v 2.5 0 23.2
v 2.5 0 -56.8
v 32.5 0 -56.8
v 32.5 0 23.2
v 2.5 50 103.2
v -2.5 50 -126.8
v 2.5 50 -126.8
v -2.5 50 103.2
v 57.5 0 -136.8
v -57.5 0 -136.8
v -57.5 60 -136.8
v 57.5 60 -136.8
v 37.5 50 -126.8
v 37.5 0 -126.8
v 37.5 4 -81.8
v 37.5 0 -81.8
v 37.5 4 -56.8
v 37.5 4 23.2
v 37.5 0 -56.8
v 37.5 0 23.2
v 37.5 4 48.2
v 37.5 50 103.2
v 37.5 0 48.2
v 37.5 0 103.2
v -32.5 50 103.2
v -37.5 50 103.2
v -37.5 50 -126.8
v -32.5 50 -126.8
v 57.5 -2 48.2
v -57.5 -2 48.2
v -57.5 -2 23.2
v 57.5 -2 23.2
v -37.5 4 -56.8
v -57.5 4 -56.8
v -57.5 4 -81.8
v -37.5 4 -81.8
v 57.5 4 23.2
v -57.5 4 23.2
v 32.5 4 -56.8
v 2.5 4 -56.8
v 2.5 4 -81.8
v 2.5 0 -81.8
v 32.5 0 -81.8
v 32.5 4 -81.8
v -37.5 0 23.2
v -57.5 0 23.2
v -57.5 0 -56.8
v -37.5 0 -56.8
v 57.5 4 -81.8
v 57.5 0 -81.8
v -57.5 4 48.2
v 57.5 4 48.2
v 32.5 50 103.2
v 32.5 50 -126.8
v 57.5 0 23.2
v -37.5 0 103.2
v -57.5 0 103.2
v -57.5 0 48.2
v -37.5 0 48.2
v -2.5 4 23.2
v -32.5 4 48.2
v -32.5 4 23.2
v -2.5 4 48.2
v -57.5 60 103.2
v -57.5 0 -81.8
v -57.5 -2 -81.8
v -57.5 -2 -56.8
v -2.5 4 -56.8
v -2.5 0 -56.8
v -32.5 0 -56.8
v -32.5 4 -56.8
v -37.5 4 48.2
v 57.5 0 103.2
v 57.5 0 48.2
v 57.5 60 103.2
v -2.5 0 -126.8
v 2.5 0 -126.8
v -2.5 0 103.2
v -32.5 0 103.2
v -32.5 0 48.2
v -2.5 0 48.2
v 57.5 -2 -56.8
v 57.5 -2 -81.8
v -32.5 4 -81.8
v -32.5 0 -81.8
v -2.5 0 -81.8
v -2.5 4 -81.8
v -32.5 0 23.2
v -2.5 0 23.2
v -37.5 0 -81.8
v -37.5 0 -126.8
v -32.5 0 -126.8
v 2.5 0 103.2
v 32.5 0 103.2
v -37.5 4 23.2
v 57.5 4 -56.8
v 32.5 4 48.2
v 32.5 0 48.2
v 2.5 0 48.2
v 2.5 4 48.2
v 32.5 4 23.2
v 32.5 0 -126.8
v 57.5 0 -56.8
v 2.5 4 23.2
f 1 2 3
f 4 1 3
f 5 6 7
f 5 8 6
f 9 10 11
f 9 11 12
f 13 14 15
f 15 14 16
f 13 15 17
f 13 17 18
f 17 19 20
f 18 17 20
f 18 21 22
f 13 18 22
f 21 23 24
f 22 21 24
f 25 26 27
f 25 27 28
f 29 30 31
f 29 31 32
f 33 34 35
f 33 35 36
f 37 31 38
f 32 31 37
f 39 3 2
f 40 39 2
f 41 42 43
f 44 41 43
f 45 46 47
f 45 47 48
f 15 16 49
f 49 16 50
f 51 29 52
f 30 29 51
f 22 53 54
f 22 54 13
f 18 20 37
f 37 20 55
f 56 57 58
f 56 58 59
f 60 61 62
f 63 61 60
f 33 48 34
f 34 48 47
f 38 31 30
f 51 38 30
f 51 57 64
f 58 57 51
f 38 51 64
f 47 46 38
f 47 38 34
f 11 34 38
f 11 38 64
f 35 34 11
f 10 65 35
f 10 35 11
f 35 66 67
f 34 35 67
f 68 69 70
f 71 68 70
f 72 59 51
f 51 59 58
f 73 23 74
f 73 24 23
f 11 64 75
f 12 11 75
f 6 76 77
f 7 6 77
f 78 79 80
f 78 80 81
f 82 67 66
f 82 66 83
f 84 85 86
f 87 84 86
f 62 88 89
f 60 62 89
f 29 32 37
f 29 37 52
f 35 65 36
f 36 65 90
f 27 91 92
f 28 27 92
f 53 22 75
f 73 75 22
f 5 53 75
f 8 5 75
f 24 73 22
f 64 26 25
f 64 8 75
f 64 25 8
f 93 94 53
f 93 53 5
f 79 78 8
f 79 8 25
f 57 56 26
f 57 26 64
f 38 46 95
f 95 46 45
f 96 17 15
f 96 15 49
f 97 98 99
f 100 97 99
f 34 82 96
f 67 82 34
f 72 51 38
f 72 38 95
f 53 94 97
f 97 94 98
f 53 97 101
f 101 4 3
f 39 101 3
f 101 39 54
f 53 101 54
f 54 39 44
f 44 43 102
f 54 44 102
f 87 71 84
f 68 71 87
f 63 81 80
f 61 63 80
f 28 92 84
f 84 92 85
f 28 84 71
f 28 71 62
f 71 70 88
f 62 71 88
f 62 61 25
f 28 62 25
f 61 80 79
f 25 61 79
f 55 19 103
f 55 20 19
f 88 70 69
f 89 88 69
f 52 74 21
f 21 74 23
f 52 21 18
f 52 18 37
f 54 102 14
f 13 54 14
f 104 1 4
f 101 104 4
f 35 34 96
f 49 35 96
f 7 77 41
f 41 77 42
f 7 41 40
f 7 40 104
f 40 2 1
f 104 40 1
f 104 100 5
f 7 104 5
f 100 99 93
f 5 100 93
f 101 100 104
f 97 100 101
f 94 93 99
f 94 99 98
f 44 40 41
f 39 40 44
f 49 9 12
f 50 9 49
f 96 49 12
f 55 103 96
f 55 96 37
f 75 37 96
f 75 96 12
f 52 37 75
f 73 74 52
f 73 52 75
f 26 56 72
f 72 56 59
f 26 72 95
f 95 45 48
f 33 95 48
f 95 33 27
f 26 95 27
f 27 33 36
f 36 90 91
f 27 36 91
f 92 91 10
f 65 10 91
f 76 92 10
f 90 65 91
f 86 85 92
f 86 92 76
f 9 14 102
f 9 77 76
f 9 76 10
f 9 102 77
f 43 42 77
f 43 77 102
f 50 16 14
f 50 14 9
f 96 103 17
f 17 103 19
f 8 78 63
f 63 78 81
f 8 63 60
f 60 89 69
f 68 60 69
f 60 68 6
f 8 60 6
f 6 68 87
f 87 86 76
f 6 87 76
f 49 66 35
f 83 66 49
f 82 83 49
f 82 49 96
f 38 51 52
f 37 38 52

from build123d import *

# Parameters (mm, degrees)
F0_W          = 20
F0_H          = 55
F0_W_2        = 5
F0_H_2        = 25
F0_W_3        = 30
F0_H_3        = 80
F0_H_4        = 45
F0_H_5        = 10
F1_DEPTH      = 60
F2_DEPTH      = 50
F3_DEPTH      = 4
F4_DEPTH      = 2
F4_DEPTH_BACK = 4
F5_DEPTH      = 2
F5_DEPTH_BACK = 4


with BuildPart() as f1:
    # F0 (on Front) → F1 (new body)
    with BuildSketch(Plane.XZ):
        with Locations((-47.5, 75.7)):
            Rectangle(F0_W, F0_H)
        with Locations((-35, 75.7)):
            Rectangle(F0_W_2, F0_H)
        with Locations((-47.5, 35.7)):
            Rectangle(F0_W, F0_H_2)
        with Locations((-17.5, 75.7)):
            Rectangle(F0_W_3, F0_H)
        with Locations((-47.5, -16.8)):
            Rectangle(F0_W, F0_H_3)
        with Locations((0, 75.7)):
            Rectangle(F0_W_2, F0_H)
        with Locations((-47.5, -69.3)):
            Rectangle(F0_W, F0_H_2)
        with Locations((17.5, 75.7)):
            Rectangle(F0_W_3, F0_H)
        with Locations((-47.5, -104.3)):
            Rectangle(F0_W, F0_H_4)
        with Locations((35, 75.7)):
            Rectangle(F0_W_2, F0_H)
        with Locations((-47.5, -131.8)):
            Rectangle(F0_W, F0_H_5)
        with Locations((47.5, 75.7)):
            Rectangle(F0_W, F0_H)
        Polygon((-32.5, -126.8), (-37.5, -126.8), (-37.5, -136.8), (37.5, -136.8), (37.5, -126.8), (32.5, -126.8), (2.5, -126.8), (-2.5, -126.8), align=None)
        with Locations((47.5, 35.7)):
            Rectangle(F0_W, F0_H_2)
        with Locations((47.5, -16.8)):
            Rectangle(F0_W, F0_H_3)
        with Locations((47.5, -131.8)):
            Rectangle(F0_W, F0_H_5)
        with Locations((47.5, -69.3)):
            Rectangle(F0_W, F0_H_2)
        with Locations((47.5, -104.3)):
            Rectangle(F0_W, F0_H_4)
        with Locations((-35, -104.3)):
            Rectangle(F0_W_2, F0_H_4)
        with Locations((-17.5, -104.3)):
            Rectangle(F0_W_3, F0_H_4)
        with Locations((-17.5, -16.8)):
            Rectangle(F0_W_3, F0_H_3)
        with Locations((-17.5, 35.7)):
            Rectangle(F0_W_3, F0_H_2)
        with Locations((-17.5, -69.3)):
            Rectangle(F0_W_3, F0_H_2)
        with Locations((-35, -69.3)):
            Rectangle(F0_W_2, F0_H_2)
        with Locations((-35, -16.8)):
            Rectangle(F0_W_2, F0_H_3)
        with Locations((-35, 35.7)):
            Rectangle(F0_W_2, F0_H_2)
        with Locations((0, 35.7)):
            Rectangle(F0_W_2, F0_H_2)
        with Locations((17.5, 35.7)):
            Rectangle(F0_W_3, F0_H_2)
        with Locations((35, 35.7)):
            Rectangle(F0_W_2, F0_H_2)
        with Locations((35, -16.8)):
            Rectangle(F0_W_2, F0_H_3)
        with Locations((17.5, -16.8)):
            Rectangle(F0_W_3, F0_H_3)
        with Locations((0, -16.8)):
            Rectangle(F0_W_2, F0_H_3)
        with Locations((0, -69.3)):
            Rectangle(F0_W_2, F0_H_2)
        with Locations((0, -104.3)):
            Rectangle(F0_W_2, F0_H_4)
        with Locations((17.5, -104.3)):
            Rectangle(F0_W_3, F0_H_4)
        with Locations((35, -104.3)):
            Rectangle(F0_W_2, F0_H_4)
        with Locations((35, -69.3)):
            Rectangle(F0_W_2, F0_H_2)
        with Locations((17.5, -69.3)):
            Rectangle(F0_W_3, F0_H_2)
    extrude(amount=-F1_DEPTH)

    # F0 (on Front) → F2 (cut)
    with BuildSketch(Plane.XZ):
        with Locations((-35, 75.7)):
            Rectangle(F0_W_2, F0_H)
        with Locations((-35, 35.7)):
            Rectangle(F0_W_2, F0_H_2)
        with Locations((-35, -16.8)):
            Rectangle(F0_W_2, F0_H_3)
        with Locations((-35, -69.3)):
            Rectangle(F0_W_2, F0_H_2)
        with Locations((-35, -104.3)):
            Rectangle(F0_W_2, F0_H_4)
        with Locations((0, -104.3)):
            Rectangle(F0_W_2, F0_H_4)
        with Locations((0, -69.3)):
            Rectangle(F0_W_2, F0_H_2)
        with Locations((0, -16.8)):
            Rectangle(F0_W_2, F0_H_3)
        with Locations((0, 35.7)):
            Rectangle(F0_W_2, F0_H_2)
        with Locations((0, 75.7)):
            Rectangle(F0_W_2, F0_H)
        with Locations((35, 75.7)):
            Rectangle(F0_W_2, F0_H)
        with Locations((35, 35.7)):
            Rectangle(F0_W_2, F0_H_2)
        with Locations((35, -16.8)):
            Rectangle(F0_W_2, F0_H_3)
        with Locations((35, -104.3)):
            Rectangle(F0_W_2, F0_H_4)
        with Locations((35, -69.3)):
            Rectangle(F0_W_2, F0_H_2)
    extrude(amount=-F2_DEPTH, mode=Mode.SUBTRACT)

    # F0 (on Front) → F3 (cut)
    with BuildSketch(Plane.XZ):
        with Locations((-47.5, 35.7)):
            Rectangle(F0_W, F0_H_2)
        with Locations((-35, 35.7)):
            Rectangle(F0_W_2, F0_H_2)
        with Locations((-17.5, 35.7)):
            Rectangle(F0_W_3, F0_H_2)
        with Locations((0, 35.7)):
            Rectangle(F0_W_2, F0_H_2)
        with Locations((17.5, 35.7)):
            Rectangle(F0_W_3, F0_H_2)
        with Locations((35, 35.7)):
            Rectangle(F0_W_2, F0_H_2)
        with Locations((47.5, 35.7)):
            Rectangle(F0_W, F0_H_2)
        with Locations((-47.5, -69.3)):
            Rectangle(F0_W, F0_H_2)
        with Locations((-35, -69.3)):
            Rectangle(F0_W_2, F0_H_2)
        with Locations((-17.5, -69.3)):
            Rectangle(F0_W_3, F0_H_2)
        with Locations((0, -69.3)):
            Rectangle(F0_W_2, F0_H_2)
        with Locations((35, -69.3)):
            Rectangle(F0_W_2, F0_H_2)
        with Locations((47.5, -69.3)):
            Rectangle(F0_W, F0_H_2)
        with Locations((17.5, -69.3)):
            Rectangle(F0_W_3, F0_H_2)
    extrude(amount=-F3_DEPTH, mode=Mode.SUBTRACT)


with BuildPart() as f4:
    # F0 (on Front) → F4 (new body, two sides)
    with BuildSketch(Plane.XZ) as f4_sk:
        with Locations((-47.5, 35.7)):
            Rectangle(F0_W, F0_H_2)
        with Locations((-35, 35.7)):
            Rectangle(F0_W_2, F0_H_2)
        with Locations((0, 35.7)):
            Rectangle(F0_W_2, F0_H_2)
        with Locations((17.5, 35.7)):
            Rectangle(F0_W_3, F0_H_2)
        with Locations((47.5, 35.7)):
            Rectangle(F0_W, F0_H_2)
        with Locations((-17.5, 35.7)):
            Rectangle(F0_W_3, F0_H_2)
        with Locations((35, 35.7)):
            Rectangle(F0_W_2, F0_H_2)
    extrude(amount=F4_DEPTH)
    extrude(f4_sk.sketch, amount=-F4_DEPTH_BACK)


with BuildPart() as f5:
    # F0 (on Front) → F5 (new body, two sides)
    with BuildSketch(Plane.XZ) as f5_sk:
        with Locations((-47.5, -69.3)):
            Rectangle(F0_W, F0_H_2)
        with Locations((-35, -69.3)):
            Rectangle(F0_W_2, F0_H_2)
        with Locations((-17.5, -69.3)):
            Rectangle(F0_W_3, F0_H_2)
        with Locations((0, -69.3)):
            Rectangle(F0_W_2, F0_H_2)
        with Locations((17.5, -69.3)):
            Rectangle(F0_W_3, F0_H_2)
        with Locations((35, -69.3)):
            Rectangle(F0_W_2, F0_H_2)
        with Locations((47.5, -69.3)):
            Rectangle(F0_W, F0_H_2)
    extrude(amount=F5_DEPTH)
    extrude(f5_sk.sketch, amount=-F5_DEPTH_BACK)


solid = Compound([f1.part, f4.part, f5.part])
